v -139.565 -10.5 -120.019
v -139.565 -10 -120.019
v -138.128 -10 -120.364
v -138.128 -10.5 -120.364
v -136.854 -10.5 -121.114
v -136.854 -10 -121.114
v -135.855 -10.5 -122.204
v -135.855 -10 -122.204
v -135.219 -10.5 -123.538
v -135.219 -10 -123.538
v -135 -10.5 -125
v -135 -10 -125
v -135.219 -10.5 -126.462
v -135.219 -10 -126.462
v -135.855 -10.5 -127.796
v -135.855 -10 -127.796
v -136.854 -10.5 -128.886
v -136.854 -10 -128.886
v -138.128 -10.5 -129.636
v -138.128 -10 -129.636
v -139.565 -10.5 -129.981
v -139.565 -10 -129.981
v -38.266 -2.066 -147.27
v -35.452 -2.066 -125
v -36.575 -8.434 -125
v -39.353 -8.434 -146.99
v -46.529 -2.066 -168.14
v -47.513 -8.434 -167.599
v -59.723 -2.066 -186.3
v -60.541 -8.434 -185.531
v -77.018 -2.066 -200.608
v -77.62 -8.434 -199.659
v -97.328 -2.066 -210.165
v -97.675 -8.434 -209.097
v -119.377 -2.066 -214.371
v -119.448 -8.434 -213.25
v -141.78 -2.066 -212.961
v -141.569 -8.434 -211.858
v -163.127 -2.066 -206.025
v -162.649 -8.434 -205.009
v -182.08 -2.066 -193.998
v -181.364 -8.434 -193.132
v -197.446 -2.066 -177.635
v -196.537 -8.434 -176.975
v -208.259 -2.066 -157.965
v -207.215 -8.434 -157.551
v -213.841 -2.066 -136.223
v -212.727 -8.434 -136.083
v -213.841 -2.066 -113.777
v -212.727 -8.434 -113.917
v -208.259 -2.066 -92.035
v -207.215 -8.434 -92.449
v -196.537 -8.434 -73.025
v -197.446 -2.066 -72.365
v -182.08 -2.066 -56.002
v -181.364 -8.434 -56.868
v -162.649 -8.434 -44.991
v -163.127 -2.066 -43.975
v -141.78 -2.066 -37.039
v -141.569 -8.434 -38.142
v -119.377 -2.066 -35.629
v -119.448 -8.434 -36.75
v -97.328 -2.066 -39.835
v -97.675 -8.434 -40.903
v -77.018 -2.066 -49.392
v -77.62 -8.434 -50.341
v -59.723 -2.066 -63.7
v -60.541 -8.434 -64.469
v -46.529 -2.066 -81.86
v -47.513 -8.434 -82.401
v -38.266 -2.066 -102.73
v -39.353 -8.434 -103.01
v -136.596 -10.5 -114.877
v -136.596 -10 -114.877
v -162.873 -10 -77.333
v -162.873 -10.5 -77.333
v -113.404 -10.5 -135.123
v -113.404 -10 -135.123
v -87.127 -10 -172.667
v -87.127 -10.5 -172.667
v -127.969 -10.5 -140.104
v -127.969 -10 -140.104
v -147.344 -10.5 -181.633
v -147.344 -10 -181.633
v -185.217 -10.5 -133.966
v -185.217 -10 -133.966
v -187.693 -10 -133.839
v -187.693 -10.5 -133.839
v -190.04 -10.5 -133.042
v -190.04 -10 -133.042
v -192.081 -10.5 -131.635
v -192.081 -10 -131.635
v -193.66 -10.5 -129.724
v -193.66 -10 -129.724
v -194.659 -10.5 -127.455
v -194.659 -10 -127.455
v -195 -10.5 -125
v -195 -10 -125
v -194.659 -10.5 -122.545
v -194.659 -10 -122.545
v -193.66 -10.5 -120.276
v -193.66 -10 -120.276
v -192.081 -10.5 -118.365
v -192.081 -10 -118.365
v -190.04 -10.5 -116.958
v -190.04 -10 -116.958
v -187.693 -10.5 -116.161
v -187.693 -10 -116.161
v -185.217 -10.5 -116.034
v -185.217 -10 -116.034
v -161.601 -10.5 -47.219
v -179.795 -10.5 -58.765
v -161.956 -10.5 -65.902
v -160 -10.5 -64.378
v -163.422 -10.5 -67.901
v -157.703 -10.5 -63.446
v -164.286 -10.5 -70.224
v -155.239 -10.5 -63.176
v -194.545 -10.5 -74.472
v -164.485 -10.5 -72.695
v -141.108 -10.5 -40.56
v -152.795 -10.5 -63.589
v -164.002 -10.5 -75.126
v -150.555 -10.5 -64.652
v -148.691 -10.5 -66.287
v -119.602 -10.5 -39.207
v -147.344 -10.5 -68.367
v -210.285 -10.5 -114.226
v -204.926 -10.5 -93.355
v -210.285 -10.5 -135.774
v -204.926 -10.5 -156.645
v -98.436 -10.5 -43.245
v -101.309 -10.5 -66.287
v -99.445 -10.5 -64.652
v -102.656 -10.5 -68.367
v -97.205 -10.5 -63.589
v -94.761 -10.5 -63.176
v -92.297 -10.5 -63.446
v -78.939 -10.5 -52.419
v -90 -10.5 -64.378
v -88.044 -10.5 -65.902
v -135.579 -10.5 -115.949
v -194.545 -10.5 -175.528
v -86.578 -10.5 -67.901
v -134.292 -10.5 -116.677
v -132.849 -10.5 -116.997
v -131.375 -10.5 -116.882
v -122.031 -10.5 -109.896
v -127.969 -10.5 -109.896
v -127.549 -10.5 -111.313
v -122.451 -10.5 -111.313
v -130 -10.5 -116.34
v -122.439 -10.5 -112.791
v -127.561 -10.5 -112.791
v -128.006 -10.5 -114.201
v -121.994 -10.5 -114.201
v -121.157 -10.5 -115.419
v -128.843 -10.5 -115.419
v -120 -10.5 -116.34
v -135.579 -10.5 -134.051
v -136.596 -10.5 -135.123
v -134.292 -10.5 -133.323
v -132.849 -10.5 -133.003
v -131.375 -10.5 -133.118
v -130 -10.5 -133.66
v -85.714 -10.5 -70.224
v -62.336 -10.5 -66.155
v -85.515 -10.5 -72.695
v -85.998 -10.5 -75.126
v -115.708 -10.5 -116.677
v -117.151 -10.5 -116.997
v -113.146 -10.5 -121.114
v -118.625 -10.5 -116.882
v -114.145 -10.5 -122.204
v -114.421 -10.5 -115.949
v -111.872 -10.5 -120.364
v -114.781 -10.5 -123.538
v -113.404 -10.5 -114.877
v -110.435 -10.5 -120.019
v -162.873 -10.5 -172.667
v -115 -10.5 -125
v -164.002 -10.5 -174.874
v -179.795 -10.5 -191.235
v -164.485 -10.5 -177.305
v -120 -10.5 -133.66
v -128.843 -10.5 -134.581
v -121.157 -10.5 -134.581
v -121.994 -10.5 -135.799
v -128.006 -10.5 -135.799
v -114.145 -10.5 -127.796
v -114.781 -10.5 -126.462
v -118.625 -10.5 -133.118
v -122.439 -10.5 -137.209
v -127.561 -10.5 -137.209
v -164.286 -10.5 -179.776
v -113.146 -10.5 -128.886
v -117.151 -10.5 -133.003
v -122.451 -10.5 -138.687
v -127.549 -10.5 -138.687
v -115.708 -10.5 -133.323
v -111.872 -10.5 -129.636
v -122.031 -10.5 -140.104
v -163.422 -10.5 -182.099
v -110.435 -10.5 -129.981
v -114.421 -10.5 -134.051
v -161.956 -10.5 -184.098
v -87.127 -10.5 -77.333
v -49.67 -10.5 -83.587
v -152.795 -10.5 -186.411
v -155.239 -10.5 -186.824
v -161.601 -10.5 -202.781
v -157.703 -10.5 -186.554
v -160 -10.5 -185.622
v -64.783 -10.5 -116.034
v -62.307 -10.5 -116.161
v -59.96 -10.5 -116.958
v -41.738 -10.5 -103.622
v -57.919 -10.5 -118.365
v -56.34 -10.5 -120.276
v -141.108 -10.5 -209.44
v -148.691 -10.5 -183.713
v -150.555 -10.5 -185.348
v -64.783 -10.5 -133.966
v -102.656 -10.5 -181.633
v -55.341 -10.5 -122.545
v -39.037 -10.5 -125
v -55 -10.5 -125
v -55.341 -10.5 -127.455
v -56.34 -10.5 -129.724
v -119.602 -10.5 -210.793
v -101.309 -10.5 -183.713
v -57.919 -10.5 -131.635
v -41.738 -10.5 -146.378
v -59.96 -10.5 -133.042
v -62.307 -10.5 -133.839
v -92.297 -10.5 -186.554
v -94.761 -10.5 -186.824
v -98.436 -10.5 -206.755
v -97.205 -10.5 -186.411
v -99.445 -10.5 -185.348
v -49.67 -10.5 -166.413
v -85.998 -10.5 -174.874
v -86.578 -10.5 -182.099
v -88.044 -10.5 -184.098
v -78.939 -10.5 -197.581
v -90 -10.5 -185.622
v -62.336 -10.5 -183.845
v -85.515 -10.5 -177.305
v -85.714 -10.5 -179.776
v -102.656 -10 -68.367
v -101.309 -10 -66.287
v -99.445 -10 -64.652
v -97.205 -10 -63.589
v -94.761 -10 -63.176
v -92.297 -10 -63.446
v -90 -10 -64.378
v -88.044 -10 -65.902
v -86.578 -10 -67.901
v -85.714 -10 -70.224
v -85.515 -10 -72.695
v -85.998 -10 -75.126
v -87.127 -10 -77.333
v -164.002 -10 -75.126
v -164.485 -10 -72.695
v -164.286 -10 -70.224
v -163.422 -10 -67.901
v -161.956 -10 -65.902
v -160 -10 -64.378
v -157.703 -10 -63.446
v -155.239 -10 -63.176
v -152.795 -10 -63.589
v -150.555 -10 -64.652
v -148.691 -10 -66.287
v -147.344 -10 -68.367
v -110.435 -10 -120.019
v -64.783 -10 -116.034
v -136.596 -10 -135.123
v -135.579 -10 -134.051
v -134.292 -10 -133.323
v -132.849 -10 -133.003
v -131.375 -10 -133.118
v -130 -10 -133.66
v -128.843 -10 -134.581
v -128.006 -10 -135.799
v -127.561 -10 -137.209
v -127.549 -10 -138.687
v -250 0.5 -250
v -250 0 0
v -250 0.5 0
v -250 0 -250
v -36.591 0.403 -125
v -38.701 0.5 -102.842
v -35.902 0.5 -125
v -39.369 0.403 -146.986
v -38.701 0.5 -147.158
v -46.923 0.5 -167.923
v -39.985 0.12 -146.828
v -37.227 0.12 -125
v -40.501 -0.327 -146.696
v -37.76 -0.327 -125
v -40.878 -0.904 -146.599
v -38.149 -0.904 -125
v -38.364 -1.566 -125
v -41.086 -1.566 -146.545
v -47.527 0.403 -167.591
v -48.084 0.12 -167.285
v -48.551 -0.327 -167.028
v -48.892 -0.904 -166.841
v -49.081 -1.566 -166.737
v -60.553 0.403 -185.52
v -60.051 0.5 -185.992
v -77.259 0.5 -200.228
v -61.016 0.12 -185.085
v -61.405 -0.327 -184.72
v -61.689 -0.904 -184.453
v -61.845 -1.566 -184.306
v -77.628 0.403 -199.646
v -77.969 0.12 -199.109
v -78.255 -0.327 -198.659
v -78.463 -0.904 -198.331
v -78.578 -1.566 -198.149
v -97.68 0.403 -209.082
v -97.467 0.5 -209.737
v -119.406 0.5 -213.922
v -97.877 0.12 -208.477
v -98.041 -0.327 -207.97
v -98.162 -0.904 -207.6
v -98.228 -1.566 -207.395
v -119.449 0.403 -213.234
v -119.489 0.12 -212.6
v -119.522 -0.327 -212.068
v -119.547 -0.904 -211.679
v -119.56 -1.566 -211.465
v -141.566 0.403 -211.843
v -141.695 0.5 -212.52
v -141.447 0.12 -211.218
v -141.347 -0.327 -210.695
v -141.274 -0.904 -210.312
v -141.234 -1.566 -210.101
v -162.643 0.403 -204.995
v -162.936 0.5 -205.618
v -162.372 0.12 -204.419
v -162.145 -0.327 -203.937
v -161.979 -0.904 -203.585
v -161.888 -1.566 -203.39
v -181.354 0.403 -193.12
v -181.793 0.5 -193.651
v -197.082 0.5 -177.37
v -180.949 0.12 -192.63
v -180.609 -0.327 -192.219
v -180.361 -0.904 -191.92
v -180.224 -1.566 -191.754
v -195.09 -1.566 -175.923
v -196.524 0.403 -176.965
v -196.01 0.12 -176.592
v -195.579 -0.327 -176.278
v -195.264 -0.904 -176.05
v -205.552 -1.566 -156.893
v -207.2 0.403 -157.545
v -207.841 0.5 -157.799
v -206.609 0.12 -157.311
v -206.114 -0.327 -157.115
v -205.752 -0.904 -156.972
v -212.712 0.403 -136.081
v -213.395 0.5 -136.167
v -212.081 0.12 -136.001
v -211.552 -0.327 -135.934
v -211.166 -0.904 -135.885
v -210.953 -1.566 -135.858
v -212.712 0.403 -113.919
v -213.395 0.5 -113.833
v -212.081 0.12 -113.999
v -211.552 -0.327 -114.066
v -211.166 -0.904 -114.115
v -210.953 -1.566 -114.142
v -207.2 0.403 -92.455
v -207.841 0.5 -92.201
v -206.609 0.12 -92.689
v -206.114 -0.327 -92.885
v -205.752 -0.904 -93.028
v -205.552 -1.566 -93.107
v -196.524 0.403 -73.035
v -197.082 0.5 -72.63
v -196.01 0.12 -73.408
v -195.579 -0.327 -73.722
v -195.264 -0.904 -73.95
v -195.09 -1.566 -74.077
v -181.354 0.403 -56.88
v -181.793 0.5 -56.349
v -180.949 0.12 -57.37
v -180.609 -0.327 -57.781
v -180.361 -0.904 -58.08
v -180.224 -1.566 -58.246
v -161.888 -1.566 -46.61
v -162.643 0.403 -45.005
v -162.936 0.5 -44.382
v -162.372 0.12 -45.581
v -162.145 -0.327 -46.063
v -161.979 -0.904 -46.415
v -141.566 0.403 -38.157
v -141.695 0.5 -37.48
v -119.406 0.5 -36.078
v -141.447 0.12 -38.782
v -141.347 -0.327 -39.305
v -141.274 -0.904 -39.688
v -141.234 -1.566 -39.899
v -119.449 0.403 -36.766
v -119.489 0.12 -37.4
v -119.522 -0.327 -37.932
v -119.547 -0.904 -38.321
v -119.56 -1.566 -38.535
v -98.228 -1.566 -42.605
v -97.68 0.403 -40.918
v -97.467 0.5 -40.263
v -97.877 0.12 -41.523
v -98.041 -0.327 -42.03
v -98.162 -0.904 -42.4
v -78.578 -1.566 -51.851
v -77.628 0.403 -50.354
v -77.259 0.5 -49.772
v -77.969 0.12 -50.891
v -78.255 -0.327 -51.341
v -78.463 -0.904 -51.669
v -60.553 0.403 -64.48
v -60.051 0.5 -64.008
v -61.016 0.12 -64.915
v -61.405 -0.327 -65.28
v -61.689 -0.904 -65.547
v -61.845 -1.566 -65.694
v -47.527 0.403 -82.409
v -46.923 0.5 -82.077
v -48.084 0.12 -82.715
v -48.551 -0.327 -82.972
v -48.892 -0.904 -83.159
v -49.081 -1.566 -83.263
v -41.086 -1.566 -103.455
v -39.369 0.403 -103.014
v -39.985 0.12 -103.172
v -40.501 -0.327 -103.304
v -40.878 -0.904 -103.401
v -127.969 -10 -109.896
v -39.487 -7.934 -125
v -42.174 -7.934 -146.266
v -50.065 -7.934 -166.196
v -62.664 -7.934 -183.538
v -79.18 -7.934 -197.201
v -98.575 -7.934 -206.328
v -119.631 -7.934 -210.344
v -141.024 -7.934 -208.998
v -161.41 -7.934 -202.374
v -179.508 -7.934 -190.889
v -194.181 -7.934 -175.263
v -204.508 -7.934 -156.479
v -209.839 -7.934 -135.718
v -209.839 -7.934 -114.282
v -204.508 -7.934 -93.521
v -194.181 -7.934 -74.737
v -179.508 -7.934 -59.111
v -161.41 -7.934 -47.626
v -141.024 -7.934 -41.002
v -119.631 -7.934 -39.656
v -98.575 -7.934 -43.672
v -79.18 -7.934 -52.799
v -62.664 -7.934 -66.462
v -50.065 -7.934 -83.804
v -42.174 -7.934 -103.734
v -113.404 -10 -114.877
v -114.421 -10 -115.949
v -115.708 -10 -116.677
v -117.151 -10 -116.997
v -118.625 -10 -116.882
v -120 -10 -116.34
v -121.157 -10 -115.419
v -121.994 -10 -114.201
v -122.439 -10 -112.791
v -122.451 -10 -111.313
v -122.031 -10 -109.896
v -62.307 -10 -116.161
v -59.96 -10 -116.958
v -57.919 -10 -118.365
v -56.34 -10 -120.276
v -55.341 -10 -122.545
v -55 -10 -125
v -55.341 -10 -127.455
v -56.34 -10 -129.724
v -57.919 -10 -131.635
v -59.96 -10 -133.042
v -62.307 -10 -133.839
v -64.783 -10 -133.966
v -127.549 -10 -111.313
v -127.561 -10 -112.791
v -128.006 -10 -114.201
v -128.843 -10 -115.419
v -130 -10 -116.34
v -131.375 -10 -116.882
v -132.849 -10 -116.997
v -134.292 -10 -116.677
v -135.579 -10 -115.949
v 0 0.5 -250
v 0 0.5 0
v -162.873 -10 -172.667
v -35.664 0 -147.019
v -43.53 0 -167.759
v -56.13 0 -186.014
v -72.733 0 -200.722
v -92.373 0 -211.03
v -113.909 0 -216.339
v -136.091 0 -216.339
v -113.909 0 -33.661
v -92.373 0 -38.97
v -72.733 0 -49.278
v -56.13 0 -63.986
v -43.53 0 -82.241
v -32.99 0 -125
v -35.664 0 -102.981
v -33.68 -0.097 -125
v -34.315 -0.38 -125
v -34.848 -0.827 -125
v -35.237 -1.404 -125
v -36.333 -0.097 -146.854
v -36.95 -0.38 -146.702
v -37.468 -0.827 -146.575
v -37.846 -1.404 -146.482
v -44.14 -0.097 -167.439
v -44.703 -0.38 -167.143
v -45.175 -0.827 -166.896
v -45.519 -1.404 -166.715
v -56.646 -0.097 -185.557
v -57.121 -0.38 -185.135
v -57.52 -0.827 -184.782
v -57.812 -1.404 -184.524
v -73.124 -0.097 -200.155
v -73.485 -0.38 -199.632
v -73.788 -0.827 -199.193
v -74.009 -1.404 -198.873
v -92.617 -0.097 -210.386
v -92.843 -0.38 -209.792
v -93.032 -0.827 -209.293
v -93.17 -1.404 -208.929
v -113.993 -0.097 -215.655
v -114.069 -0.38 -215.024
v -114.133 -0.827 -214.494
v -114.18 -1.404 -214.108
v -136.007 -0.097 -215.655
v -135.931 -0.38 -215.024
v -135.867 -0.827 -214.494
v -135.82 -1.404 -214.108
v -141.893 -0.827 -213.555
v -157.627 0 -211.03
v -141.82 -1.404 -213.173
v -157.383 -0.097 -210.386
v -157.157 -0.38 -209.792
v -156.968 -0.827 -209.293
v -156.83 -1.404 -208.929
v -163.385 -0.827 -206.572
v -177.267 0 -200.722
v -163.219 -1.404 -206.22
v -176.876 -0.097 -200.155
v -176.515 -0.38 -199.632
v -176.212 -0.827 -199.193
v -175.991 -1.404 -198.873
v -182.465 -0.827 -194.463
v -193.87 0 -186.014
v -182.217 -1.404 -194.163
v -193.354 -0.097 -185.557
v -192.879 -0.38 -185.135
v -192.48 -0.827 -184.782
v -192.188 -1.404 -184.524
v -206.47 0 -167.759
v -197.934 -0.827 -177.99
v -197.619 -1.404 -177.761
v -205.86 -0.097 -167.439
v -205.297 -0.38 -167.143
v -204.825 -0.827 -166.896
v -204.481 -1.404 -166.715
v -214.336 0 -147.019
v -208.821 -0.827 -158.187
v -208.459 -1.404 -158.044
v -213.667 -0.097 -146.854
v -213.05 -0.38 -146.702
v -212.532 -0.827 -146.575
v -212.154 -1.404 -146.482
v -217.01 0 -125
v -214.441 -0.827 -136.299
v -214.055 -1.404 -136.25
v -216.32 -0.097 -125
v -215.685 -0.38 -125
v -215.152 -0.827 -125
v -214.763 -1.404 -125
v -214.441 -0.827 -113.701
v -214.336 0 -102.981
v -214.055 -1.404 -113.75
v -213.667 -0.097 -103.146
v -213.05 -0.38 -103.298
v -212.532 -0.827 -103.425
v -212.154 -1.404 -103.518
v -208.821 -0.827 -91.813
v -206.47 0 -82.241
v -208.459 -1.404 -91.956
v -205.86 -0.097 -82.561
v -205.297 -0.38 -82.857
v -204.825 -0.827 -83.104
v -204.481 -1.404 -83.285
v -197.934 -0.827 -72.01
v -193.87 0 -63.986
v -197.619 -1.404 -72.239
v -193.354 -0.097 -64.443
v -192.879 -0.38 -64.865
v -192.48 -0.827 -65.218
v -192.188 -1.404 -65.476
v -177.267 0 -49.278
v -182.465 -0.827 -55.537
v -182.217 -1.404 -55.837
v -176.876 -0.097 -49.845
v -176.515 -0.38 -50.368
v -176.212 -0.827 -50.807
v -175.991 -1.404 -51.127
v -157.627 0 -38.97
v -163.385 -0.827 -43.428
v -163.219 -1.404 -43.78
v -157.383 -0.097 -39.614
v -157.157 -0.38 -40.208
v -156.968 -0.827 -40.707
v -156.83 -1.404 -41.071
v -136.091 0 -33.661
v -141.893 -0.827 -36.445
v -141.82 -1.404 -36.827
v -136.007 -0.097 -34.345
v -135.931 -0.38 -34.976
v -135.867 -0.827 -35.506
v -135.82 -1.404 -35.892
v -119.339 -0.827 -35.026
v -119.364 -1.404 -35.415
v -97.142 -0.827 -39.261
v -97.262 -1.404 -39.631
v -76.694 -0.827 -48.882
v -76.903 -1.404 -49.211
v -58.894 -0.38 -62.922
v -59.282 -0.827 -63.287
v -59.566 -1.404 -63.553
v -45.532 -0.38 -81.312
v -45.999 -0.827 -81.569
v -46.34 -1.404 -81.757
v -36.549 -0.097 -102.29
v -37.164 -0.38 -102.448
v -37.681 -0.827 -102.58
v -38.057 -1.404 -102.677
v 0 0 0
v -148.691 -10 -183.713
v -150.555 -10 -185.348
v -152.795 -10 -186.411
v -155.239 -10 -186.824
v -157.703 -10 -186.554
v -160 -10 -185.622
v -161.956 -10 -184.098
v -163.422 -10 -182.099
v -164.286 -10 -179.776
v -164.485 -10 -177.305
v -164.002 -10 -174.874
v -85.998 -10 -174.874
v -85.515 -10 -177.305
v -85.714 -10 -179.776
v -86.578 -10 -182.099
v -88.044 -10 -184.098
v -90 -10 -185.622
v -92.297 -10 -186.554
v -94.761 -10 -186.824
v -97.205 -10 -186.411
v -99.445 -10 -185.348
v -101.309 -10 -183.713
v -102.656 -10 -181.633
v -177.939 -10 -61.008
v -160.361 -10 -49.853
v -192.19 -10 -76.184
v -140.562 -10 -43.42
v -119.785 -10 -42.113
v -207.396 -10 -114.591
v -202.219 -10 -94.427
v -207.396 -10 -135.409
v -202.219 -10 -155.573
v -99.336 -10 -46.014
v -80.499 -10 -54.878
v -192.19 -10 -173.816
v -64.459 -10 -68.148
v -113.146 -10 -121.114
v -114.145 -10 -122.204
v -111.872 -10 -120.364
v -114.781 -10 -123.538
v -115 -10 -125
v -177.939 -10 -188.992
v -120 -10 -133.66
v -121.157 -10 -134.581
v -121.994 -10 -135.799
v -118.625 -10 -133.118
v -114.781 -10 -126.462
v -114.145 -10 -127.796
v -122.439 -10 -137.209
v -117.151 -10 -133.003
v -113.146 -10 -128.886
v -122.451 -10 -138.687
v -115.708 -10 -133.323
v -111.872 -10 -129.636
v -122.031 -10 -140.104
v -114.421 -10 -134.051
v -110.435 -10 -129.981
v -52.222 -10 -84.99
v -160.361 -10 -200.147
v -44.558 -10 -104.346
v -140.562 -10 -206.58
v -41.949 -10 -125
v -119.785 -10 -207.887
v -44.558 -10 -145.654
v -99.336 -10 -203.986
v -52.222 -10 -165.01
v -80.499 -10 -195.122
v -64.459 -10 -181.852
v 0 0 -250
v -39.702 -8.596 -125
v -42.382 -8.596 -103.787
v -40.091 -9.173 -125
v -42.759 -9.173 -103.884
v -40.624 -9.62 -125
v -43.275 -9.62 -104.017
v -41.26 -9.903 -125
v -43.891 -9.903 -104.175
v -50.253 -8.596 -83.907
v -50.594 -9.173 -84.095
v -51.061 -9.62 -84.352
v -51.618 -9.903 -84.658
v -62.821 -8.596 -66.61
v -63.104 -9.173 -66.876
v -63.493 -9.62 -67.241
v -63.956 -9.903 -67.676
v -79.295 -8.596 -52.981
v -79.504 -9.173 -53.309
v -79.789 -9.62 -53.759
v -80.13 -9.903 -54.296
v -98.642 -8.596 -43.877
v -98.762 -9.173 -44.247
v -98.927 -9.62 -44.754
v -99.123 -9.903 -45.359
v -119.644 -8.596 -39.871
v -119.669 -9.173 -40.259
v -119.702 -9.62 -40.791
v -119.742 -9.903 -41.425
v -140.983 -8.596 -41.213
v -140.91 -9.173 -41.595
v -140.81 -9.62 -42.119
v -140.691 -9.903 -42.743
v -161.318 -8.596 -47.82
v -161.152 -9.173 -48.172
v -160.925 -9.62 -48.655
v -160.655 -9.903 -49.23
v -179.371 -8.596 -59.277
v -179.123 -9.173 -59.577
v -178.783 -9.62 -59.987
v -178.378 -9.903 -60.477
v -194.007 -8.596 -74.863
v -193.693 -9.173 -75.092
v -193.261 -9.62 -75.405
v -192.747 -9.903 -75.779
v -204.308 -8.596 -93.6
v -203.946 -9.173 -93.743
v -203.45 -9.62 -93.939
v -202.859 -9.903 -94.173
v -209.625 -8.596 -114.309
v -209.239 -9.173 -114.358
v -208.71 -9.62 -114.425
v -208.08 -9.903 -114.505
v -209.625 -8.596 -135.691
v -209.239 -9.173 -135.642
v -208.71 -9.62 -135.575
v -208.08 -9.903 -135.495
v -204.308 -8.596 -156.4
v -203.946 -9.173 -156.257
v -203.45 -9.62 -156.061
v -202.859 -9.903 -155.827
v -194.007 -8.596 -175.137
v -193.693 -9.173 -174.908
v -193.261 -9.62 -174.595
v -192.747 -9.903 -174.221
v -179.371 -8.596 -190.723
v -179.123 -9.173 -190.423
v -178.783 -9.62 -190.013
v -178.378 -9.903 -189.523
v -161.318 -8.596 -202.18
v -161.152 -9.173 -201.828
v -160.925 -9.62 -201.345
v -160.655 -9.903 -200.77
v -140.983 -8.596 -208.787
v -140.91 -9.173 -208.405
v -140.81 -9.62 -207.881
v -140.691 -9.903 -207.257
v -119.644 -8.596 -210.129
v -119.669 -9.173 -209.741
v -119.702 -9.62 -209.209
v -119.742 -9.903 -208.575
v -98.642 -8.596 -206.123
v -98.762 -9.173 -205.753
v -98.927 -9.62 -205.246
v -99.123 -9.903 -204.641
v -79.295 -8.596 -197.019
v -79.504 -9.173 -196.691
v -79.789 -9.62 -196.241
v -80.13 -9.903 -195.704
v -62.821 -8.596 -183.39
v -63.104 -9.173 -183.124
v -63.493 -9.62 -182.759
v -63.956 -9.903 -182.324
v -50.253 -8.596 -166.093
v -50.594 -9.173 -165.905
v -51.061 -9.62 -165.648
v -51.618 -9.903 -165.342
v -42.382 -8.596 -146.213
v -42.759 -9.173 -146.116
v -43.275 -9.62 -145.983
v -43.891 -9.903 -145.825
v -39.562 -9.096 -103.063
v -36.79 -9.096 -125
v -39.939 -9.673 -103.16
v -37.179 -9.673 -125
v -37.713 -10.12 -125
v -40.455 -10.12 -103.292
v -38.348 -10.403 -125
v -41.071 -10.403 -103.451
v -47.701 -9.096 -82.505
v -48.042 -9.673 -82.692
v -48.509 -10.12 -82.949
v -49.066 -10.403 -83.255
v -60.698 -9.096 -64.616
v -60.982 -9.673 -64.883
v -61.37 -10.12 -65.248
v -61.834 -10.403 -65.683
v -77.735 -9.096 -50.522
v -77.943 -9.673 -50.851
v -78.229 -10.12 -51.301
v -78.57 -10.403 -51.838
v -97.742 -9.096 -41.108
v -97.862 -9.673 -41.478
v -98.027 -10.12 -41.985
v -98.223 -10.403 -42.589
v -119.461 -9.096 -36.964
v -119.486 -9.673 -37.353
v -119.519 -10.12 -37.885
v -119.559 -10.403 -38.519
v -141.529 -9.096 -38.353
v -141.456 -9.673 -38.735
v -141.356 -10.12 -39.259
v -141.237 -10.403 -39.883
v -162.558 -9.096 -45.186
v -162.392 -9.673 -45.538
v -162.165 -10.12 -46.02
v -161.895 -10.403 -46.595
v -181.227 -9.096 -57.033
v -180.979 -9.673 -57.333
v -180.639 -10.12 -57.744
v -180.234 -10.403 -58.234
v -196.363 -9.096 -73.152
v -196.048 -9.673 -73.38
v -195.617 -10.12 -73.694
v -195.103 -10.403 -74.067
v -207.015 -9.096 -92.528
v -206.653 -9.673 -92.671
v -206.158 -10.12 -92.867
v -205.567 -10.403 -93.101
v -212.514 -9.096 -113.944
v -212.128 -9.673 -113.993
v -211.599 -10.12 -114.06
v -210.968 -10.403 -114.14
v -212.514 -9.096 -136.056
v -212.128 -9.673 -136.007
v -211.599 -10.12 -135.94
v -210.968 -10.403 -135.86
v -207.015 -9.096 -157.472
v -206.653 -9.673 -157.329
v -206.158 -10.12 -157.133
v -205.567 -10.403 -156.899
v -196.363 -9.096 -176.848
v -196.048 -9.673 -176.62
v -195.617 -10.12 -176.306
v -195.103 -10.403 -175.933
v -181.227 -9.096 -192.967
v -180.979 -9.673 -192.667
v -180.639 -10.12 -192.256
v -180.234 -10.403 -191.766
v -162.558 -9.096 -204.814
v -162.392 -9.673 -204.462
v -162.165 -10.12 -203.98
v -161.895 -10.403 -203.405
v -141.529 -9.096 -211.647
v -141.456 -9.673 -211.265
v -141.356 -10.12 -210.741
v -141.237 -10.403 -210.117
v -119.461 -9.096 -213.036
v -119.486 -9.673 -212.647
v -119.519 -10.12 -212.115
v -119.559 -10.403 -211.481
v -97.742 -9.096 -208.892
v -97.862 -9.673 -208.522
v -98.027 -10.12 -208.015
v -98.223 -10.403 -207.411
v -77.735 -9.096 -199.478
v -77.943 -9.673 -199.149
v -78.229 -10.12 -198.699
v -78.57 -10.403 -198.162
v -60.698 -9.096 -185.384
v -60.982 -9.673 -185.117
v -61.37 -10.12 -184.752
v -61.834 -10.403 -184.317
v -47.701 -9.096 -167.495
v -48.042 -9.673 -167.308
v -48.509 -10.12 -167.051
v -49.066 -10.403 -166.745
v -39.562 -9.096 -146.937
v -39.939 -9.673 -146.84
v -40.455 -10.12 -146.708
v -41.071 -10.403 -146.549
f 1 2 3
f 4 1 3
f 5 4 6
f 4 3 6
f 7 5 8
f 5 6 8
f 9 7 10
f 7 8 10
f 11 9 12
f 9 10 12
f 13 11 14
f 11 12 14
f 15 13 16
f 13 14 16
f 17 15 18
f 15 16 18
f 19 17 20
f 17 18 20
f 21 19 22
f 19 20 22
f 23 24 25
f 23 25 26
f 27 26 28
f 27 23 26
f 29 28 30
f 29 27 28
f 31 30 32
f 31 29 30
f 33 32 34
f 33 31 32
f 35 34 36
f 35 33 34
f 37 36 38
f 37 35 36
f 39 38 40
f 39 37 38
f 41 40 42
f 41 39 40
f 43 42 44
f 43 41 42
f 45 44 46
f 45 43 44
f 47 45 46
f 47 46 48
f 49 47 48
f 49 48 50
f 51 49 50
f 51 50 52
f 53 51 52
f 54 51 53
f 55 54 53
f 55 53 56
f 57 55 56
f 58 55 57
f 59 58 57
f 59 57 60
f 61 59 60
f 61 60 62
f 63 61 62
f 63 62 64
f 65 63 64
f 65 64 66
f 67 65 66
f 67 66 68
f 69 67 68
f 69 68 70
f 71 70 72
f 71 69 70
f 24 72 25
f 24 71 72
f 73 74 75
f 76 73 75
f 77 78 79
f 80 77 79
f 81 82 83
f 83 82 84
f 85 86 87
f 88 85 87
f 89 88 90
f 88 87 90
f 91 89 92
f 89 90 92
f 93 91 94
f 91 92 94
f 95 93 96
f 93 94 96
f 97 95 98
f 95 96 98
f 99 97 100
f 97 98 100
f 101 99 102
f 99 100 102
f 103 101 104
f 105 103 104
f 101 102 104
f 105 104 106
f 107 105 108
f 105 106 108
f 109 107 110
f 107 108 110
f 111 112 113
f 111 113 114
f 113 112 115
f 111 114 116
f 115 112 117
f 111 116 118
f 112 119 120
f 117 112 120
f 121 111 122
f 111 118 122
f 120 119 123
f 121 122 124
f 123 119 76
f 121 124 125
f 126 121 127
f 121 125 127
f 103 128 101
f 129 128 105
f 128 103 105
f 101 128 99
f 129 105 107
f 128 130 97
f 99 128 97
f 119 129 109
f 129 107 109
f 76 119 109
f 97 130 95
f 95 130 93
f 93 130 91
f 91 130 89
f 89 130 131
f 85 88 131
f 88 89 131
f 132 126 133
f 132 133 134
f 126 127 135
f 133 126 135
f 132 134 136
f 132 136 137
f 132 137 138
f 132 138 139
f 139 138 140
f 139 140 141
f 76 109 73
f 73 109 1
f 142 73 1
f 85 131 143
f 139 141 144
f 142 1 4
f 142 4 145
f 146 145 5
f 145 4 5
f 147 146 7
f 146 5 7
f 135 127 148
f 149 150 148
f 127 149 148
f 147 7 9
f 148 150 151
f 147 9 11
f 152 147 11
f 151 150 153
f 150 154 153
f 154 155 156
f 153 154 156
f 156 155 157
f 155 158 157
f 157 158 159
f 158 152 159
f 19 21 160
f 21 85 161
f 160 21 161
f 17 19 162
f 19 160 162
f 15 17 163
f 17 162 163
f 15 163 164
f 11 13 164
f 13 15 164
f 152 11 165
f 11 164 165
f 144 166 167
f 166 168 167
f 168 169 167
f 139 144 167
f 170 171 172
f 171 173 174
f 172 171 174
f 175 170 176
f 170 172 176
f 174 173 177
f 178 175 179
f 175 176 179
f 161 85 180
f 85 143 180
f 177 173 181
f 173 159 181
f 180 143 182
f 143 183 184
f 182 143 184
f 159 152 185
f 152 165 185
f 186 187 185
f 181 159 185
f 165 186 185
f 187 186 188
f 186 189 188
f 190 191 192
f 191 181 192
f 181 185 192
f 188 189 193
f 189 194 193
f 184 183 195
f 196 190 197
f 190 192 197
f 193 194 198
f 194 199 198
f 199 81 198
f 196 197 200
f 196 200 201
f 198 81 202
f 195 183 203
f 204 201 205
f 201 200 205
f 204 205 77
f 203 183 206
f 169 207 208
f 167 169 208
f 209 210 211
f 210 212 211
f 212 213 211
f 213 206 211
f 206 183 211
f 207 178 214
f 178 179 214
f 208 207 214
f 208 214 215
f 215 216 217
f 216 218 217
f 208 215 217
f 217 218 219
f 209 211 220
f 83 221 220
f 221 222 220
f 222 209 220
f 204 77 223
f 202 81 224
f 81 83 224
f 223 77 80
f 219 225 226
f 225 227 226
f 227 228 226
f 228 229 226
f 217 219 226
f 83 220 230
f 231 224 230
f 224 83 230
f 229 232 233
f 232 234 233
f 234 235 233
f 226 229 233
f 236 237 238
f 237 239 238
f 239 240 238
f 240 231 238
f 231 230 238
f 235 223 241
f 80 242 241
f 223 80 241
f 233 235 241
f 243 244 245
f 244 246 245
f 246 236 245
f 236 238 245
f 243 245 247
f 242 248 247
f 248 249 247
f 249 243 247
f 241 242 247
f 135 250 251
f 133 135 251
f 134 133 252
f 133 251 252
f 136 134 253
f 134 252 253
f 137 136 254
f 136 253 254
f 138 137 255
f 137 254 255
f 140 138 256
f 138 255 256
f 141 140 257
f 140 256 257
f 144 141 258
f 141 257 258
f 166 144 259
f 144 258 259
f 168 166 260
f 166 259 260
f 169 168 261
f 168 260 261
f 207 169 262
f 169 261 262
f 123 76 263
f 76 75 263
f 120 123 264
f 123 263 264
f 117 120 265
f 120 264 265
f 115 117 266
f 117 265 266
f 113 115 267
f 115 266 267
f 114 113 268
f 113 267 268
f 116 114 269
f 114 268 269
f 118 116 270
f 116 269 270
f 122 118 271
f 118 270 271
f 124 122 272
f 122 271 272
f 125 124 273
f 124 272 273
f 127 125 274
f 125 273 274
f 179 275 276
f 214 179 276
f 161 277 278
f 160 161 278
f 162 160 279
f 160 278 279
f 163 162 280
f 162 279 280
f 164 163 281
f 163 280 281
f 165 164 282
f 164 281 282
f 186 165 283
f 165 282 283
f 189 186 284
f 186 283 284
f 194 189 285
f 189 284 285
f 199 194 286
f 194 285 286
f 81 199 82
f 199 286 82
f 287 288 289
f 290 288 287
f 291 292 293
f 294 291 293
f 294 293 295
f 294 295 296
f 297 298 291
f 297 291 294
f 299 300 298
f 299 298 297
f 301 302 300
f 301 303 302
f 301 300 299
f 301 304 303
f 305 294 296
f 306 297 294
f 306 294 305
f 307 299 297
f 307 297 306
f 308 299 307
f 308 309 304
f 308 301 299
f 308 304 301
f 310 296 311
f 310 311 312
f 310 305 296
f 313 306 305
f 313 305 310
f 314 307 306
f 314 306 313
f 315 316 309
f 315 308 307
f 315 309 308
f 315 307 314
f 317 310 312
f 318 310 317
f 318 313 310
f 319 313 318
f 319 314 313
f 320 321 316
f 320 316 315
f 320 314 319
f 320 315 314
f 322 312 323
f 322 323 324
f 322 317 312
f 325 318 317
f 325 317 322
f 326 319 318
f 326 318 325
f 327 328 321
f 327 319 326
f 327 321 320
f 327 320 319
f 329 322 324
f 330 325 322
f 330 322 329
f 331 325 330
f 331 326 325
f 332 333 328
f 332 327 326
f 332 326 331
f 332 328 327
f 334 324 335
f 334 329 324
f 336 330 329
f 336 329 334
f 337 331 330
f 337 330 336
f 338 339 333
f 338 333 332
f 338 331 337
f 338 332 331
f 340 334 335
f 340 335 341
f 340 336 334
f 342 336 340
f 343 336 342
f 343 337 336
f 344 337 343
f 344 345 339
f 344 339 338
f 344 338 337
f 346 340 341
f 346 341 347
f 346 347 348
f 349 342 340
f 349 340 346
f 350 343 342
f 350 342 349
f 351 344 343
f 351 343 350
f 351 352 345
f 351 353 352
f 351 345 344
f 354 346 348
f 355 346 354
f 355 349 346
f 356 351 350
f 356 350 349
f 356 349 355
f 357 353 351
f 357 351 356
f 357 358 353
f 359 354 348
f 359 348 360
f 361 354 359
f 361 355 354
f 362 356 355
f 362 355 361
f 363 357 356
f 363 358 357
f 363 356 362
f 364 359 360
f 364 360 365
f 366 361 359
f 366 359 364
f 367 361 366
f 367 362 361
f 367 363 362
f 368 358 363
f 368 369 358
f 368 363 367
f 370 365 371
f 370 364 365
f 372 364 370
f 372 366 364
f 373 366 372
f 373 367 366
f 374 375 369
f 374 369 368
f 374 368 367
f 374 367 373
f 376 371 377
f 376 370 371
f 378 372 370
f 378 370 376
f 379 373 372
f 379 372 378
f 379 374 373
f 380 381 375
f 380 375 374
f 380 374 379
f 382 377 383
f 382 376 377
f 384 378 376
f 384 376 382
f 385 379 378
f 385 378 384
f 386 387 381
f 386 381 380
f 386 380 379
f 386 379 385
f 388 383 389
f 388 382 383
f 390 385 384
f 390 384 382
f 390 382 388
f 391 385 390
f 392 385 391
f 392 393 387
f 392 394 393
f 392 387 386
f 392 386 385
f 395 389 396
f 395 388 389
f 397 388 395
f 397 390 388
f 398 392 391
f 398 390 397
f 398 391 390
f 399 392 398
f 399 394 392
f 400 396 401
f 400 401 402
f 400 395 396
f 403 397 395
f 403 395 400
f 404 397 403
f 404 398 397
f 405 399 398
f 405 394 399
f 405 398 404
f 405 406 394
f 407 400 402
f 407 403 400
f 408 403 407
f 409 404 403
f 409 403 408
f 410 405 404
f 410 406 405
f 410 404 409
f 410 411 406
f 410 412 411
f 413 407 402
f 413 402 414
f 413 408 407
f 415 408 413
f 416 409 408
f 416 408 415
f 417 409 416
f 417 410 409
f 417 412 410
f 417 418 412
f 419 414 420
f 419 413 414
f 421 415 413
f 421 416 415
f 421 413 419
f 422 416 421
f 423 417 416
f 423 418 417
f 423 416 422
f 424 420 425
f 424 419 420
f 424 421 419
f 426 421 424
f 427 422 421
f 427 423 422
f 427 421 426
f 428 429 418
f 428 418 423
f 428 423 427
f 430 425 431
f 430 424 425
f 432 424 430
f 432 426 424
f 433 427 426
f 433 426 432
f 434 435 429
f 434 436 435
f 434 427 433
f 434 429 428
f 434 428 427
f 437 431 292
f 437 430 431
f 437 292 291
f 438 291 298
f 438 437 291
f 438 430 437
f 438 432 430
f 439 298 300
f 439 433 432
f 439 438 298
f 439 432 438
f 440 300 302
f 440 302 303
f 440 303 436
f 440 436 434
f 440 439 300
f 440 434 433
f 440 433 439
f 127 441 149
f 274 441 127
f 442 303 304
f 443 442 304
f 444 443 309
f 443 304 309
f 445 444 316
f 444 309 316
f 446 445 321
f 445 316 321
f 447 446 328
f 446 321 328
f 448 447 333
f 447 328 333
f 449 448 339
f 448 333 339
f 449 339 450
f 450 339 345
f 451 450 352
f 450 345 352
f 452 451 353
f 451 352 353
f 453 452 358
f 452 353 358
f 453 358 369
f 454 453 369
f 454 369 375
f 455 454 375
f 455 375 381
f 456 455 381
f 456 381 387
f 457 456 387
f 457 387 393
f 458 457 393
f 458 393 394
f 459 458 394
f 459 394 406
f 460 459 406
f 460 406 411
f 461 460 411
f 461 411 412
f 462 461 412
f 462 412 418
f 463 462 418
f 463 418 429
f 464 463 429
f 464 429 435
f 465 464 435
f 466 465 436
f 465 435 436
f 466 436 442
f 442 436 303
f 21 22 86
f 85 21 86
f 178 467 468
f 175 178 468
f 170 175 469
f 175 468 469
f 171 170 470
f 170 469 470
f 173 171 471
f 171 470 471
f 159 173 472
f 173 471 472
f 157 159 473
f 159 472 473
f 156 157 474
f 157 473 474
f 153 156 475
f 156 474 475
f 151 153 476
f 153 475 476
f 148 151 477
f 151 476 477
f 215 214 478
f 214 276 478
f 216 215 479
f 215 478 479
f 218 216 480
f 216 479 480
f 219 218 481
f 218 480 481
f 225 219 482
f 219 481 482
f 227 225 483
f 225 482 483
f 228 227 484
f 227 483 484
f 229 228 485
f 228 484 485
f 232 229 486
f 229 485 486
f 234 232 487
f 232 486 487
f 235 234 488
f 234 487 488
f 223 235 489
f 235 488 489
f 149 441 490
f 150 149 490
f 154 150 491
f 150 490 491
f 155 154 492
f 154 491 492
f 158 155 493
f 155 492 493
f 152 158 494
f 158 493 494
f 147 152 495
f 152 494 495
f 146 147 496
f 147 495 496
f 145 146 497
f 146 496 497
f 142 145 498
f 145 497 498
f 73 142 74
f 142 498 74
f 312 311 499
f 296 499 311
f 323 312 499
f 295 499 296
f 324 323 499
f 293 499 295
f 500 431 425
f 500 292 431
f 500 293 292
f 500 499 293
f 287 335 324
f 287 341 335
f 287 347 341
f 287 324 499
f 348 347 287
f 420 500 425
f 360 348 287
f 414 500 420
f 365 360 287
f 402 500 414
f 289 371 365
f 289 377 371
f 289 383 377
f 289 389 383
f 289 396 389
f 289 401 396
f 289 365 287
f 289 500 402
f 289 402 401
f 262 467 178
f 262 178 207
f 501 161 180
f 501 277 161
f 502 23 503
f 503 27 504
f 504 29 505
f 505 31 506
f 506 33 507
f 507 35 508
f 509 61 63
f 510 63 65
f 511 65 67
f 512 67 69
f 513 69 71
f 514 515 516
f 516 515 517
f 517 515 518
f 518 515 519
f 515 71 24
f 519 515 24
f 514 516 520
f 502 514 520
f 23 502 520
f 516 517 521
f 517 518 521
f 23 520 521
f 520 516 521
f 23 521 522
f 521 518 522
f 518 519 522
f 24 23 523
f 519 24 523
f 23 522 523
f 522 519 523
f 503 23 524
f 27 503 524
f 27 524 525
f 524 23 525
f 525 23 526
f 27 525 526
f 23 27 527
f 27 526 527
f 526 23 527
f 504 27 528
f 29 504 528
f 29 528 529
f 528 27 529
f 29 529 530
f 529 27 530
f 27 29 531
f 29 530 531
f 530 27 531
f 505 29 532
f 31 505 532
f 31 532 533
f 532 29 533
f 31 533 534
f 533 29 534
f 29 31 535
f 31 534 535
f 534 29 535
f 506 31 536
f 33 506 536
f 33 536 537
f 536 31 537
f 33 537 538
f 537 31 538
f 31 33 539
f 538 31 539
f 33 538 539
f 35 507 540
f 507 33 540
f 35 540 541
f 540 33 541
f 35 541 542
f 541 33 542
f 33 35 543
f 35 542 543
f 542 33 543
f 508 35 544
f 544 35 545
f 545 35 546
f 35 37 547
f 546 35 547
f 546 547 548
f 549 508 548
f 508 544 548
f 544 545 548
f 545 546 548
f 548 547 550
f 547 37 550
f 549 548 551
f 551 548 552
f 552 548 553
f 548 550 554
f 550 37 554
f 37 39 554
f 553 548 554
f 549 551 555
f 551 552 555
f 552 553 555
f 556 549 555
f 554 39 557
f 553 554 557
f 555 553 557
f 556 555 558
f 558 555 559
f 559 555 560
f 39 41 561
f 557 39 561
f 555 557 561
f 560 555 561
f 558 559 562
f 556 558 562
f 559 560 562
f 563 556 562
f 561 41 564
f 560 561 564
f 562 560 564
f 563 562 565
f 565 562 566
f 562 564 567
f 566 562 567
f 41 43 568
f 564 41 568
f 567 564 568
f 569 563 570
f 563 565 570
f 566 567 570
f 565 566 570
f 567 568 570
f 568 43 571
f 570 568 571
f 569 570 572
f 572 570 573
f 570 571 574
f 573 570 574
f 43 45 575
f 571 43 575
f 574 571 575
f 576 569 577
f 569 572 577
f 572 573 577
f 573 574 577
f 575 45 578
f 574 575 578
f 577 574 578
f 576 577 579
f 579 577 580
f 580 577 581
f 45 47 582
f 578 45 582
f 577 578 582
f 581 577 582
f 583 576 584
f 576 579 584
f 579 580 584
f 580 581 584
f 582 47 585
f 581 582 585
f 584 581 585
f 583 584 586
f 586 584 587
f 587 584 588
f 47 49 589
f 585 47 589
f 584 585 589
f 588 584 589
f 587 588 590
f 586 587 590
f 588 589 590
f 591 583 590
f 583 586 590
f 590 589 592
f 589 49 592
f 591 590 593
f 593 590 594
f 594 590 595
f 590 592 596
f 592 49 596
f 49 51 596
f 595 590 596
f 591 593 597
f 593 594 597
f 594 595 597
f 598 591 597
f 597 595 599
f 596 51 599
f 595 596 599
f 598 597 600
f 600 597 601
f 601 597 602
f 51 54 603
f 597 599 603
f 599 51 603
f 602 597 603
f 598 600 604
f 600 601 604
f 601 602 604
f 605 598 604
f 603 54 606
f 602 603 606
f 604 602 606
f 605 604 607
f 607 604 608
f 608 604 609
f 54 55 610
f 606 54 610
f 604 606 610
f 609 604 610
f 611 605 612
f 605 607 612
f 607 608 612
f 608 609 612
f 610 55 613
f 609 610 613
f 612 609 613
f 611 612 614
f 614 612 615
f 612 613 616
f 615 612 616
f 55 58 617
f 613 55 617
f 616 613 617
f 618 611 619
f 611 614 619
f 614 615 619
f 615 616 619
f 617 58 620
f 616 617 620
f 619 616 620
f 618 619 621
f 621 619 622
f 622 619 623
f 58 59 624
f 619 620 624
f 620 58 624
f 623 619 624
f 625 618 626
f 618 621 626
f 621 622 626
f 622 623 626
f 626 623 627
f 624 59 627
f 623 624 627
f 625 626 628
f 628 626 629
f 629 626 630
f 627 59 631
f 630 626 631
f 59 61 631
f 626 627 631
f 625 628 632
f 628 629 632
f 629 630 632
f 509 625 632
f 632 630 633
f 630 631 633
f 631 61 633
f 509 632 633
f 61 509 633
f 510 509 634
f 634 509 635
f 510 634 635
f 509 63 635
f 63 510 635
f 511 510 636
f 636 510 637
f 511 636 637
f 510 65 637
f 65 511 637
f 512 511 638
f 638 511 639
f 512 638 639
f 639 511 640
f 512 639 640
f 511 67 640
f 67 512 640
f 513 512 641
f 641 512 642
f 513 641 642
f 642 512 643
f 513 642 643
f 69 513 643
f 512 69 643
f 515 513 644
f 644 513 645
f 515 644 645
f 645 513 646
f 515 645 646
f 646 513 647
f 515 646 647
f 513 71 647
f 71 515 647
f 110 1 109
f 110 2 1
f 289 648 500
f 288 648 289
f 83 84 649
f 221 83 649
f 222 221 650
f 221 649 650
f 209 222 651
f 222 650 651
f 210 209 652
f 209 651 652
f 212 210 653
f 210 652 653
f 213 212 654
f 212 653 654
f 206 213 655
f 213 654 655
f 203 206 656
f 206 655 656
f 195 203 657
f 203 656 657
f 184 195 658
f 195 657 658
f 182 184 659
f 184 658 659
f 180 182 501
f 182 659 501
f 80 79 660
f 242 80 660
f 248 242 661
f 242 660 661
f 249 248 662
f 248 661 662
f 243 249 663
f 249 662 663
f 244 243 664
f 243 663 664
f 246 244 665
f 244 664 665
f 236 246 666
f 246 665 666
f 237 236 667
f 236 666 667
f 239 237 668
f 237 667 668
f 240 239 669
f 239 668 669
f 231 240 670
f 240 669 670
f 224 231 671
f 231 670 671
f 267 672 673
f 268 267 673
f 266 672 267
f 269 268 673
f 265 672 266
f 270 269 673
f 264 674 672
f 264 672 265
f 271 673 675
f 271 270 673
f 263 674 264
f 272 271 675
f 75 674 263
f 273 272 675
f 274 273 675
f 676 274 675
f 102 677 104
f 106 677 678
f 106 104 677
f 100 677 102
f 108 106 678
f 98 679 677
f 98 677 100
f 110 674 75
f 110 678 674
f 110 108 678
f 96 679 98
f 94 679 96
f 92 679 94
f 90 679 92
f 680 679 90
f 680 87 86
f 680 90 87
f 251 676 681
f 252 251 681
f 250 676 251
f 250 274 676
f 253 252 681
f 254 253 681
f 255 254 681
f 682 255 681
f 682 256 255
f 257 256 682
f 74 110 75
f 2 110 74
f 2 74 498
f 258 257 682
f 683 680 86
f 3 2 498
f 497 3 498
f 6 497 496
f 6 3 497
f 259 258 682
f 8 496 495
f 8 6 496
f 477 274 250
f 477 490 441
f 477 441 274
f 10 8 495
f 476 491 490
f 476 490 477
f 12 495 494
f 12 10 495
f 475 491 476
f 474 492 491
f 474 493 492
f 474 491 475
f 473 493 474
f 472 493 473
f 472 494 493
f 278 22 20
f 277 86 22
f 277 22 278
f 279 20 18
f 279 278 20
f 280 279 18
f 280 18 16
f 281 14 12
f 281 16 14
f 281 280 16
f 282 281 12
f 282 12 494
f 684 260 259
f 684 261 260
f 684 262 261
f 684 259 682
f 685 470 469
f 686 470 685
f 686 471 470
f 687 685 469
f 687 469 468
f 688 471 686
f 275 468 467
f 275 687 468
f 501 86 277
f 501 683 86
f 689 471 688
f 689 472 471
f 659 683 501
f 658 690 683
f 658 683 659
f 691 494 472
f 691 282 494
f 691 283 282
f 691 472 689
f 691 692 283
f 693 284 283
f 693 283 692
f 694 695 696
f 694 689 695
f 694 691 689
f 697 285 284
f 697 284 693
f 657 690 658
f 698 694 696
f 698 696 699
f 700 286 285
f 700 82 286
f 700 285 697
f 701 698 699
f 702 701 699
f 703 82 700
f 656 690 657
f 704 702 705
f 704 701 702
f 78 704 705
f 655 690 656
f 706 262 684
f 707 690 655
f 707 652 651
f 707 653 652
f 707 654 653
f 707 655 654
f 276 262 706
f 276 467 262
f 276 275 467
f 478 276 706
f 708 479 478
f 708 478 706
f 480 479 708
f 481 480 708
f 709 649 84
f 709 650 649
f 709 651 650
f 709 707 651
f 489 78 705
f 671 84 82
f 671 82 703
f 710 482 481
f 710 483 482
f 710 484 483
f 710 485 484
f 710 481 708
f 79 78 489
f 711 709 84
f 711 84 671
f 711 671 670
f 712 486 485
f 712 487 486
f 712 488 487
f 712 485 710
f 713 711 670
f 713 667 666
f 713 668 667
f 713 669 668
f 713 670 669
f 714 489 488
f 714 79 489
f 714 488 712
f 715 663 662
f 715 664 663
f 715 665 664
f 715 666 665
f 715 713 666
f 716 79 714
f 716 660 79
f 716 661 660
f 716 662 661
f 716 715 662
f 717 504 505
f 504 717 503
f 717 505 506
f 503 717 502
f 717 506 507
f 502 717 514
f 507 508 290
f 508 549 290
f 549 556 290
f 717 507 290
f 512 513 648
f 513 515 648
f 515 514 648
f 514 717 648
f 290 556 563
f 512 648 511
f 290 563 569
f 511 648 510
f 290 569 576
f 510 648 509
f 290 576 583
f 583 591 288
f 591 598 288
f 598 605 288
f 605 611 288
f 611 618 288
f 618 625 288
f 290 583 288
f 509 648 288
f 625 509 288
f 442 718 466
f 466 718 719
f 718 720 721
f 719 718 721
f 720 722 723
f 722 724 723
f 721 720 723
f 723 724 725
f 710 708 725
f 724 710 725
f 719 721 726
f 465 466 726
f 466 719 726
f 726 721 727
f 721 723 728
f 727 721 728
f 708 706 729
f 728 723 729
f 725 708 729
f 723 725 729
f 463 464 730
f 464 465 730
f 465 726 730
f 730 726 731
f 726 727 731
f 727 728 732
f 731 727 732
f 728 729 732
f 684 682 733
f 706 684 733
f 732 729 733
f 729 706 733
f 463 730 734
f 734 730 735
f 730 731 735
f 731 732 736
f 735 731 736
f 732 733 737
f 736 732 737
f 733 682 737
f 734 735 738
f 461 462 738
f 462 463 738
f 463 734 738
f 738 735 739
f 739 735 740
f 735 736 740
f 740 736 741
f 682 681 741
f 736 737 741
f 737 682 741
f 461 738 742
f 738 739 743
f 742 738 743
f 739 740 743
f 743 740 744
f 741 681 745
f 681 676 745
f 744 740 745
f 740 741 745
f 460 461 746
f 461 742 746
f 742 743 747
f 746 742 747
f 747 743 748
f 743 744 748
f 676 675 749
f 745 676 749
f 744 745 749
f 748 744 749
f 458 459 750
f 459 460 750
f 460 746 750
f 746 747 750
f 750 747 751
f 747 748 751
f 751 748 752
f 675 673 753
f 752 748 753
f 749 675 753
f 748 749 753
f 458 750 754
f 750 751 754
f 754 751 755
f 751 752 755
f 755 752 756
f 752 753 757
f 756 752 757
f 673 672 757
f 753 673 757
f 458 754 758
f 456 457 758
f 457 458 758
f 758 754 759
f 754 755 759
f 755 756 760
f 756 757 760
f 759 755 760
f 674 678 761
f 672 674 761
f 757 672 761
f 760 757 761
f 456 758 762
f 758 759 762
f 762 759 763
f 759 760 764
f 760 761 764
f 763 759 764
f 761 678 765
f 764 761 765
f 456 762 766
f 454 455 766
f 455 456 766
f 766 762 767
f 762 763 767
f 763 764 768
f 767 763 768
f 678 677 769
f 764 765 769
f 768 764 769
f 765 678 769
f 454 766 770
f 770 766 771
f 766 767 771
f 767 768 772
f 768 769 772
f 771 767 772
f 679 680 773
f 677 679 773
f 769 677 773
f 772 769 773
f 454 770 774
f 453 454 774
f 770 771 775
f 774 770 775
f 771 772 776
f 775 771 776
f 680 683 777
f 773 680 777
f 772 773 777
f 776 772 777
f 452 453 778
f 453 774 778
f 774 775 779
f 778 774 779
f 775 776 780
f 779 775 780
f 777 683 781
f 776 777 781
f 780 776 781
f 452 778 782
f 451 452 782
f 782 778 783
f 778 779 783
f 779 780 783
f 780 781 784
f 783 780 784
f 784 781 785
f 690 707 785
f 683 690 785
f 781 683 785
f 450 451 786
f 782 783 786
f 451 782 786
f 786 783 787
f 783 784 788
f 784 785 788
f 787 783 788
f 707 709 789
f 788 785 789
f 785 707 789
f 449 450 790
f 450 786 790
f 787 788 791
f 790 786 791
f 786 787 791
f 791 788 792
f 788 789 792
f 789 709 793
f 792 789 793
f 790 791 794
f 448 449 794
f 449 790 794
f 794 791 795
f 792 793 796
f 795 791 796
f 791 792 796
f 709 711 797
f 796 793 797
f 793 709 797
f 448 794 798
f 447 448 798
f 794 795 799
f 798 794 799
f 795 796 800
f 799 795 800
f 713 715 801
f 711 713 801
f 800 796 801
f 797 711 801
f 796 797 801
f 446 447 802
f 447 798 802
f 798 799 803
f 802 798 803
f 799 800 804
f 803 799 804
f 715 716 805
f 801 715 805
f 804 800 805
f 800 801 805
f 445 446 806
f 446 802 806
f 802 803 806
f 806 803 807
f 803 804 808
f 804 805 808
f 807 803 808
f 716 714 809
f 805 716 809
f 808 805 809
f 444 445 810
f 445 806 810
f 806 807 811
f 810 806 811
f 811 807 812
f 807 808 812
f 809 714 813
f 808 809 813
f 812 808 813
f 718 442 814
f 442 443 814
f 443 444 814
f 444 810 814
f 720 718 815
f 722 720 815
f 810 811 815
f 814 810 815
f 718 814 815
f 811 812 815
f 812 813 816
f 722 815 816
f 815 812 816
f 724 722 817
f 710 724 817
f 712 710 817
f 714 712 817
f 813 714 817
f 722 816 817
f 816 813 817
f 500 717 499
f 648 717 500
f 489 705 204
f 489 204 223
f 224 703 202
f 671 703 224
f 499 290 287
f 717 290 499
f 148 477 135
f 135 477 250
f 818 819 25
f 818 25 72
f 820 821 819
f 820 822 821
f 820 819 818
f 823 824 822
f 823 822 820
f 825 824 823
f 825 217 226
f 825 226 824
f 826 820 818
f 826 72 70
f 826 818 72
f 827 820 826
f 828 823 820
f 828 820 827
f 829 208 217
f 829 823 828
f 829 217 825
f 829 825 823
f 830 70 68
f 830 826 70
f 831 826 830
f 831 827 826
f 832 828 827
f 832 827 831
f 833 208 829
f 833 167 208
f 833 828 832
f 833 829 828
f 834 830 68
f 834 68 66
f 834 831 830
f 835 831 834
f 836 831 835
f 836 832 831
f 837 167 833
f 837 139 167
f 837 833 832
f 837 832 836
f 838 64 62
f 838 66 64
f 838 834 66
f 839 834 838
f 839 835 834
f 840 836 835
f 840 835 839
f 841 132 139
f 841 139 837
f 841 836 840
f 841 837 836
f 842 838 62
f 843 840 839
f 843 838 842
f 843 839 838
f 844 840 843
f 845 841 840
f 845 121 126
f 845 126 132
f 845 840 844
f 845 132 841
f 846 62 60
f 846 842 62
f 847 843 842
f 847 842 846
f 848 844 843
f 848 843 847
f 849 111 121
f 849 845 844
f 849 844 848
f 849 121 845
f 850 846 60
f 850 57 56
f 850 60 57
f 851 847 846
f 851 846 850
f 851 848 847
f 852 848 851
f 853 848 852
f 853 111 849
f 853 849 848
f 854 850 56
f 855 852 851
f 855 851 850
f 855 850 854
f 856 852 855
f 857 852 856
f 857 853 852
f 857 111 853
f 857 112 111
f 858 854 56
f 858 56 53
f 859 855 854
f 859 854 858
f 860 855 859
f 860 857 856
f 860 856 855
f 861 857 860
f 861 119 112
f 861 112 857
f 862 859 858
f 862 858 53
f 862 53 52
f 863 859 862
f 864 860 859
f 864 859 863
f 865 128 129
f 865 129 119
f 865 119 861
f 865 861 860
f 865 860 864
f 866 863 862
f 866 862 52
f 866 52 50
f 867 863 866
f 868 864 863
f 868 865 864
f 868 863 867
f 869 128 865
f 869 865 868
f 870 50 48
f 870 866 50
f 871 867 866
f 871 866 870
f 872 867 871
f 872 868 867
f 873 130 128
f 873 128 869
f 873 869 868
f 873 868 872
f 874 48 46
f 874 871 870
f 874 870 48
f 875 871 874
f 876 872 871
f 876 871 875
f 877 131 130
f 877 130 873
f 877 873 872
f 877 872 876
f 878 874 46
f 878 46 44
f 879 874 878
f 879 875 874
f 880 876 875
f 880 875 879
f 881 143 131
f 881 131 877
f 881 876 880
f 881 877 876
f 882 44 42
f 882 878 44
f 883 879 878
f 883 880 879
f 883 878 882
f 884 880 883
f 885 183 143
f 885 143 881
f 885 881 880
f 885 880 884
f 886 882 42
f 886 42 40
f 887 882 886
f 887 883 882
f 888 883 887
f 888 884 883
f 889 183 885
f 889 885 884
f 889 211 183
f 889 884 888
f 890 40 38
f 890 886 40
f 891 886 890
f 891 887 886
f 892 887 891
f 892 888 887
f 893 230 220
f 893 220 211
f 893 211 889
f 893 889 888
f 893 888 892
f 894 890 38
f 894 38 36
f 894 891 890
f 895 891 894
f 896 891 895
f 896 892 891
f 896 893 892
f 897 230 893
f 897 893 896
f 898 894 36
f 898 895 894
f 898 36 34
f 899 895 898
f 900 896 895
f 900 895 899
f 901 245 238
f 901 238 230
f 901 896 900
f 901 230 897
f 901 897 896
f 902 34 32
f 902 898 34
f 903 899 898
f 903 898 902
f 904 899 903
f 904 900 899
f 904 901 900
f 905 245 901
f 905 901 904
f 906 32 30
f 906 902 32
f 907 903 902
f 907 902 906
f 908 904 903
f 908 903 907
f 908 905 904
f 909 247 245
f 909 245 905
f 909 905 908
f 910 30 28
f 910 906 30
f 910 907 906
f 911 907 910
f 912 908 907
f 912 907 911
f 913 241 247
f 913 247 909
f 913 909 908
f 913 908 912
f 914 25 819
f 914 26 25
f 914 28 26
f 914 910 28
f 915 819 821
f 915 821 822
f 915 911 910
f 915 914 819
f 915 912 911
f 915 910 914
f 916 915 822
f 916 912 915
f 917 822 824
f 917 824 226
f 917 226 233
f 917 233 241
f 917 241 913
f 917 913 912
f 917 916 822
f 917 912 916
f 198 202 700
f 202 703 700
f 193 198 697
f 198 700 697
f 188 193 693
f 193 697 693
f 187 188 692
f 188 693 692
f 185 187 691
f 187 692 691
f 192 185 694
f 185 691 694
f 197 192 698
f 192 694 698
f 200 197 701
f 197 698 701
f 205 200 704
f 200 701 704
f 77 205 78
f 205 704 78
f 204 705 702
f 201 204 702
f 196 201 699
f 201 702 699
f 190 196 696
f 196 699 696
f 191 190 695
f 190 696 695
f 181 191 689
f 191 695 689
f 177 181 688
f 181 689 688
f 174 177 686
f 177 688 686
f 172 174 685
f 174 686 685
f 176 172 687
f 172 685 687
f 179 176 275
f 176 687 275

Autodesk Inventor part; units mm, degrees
ref_plane "YZ Plane" through (0, 0, 0) normal (1, 0, 0) x (0, 1, 0)
ref_plane "XZ Plane" through (0, 0, 0) normal (0, 1, 0) x (-1, 0, 0)
sketch "Sketch1" plane through (0, 0, 0) normal (0, 1, 0) x (-1, 0, 0)
  line L0 (0, 0) -> (250, 0)
  line L1 (250, 0) -> (250, -250)
  line L2 (250, -250) -> (0, -250)
  line L3 (0, -250) -> (0, 0)
  dimension "d0" = 250
  dimension "d1" = 250
extrude "Plate1" add sketch "Sketch1" along normal blind 0.5
sketch "Sketch2" plane through (0, 0.5, 0) normal (0, 1, 0) x (1, 0, 0)
  line L0 (0, 0) -> (-250, 0) construction
  line L1 (0, 250) -> (0, 0) construction
  circle A0 centre (-125, 125) radius 90
  line L2 (-125, 125) -> (-215, 125) construction
  line L3 (-125, 125) -> (-125, 35) construction
  circle A1 centre (-125, 125) radius 87
  dimension "d3" = 125
  dimension "d4" = 125
  dimension "d5" = 180
  dimension "d29" = 3
sketch "Sketch2 outline for Extrusion5" plane through (0, 0.5, 0) normal (0, 1, 0) x (1, 0, 0)
  circle A0 centre (-125, 125) radius 90
extrude "Extrusion5" add sketch "Sketch2 outline for Extrusion5" against normal blind 11 draft -10
extrude "Extrusion6" cut sketch "Sketch2" against normal blind 10.5 draft -10 contours A1
fillet "Fillet1" radius 2.5 4 edges at (-212, 0.5, -125) (-214.9118, 0, -125) (-213.0604, -10.5, -125) (-210.1486, -10, -125)
ref_plane "Work Plane6" through (-125, -10, -125) normal (0, 1, 0) x (-1, 0, 0)
ref_plane "Work Plane5" through (-125, 0.5, -125) normal (0, 1, 0) x (-1, 0, 0)
sketch "Sketch6" plane through (-125, -10, -125) normal (0, 1, 0) x (-1, 0, 0)
  line L0 (0, 0) -> (90, 0) construction
  line L1 (0, 0) -> (0, 90) construction
  arc A0 (60.217391, -8.965909) -> (60.217391, 8.965909) centre (61, 0) ccw
  arc A1 (14.565217, 4.981061) -> (14.565217, -4.981061) centre (15, 0) ccw
  line L2 (14.565217, -4.981061) -> (60.217391, -8.965909)
  line L3 (14.565217, 4.981061) -> (60.217391, 8.965909)
  line L4 (10, 0) -> (70, 0) construction
  arc A2 (2.968884, 15.104379) -> (11.596334, 10.123318) centre (7.5, 12.990381) ccw
  line L5 (2.968884, 15.104379) -> (22.343991, 56.632745)
  line L6 (5, 8.660254) -> (35, 60.621778) construction
  line L7 (11.596334, 10.123318) -> (37.873401, 47.666836)
  arc A3 (37.873401, 47.666836) -> (22.343991, 56.632745) centre (30.5, 52.82755) ccw
  arc A4 (-11.596334, 10.123318) -> (-2.968884, 15.104379) centre (-7.5, 12.990381) ccw
  line L8 (-11.596334, 10.123318) -> (-37.873401, 47.666836)
  line L9 (-5, 8.660254) -> (-35, 60.621778) construction
  line L10 (-2.968884, 15.104379) -> (-22.343991, 56.632745)
  arc A5 (-22.343991, 56.632745) -> (-37.873401, 47.666836) centre (-30.5, 52.82755) ccw
  arc A6 (-14.565217, -4.981061) -> (-14.565217, 4.981061) centre (-15, 0) ccw
  line L11 (-14.565217, -4.981061) -> (-60.217391, -8.965909)
  line L12 (-10, 0) -> (-70, 0) construction
  line L13 (-14.565217, 4.981061) -> (-60.217391, 8.965909)
  arc A7 (-60.217391, 8.965909) -> (-60.217391, -8.965909) centre (-61, 0) ccw
  arc A8 (-2.968884, -15.104379) -> (-11.596334, -10.123318) centre (-7.5, -12.990381) ccw
  line L14 (-2.968884, -15.104379) -> (-22.343991, -56.632745)
  line L15 (-5, -8.660254) -> (-35, -60.621778) construction
  line L16 (-11.596334, -10.123318) -> (-37.873401, -47.666836)
  arc A9 (-37.873401, -47.666836) -> (-22.343991, -56.632745) centre (-30.5, -52.82755) ccw
  arc A10 (11.596334, -10.123318) -> (2.968884, -15.104379) centre (7.5, -12.990381) ccw
  line L17 (11.596334, -10.123318) -> (37.873401, -47.666836)
  line L18 (5, -8.660254) -> (35, -60.621778) construction
  line L19 (2.968884, -15.104379) -> (22.343991, -56.632745)
  arc A11 (22.343991, -56.632745) -> (37.873401, -47.666836) centre (30.5, -52.82755) ccw
  point P0 (-125, 125)
  dimension "d38" = 5
  dimension "d39" = 9
  dimension "d40" = 15
  dimension "d41" = 60
  dimension "d42" = 360
extrude "Extrusion7" cut sketch "Sketch6" against normal blind 0.5
equation "\"d32\" = Profile - Thickness"
equation "\"d34\" = 5 * Thickness"
equation "\"d43\" = Thickness"
equation "\"d2\" = Thickness"
equation "\"BendRadius\" = Thickness"
equation "\"BendReliefWidth\" = Thickness"
equation "\"BendReliefDepth\" = 0.5 * Thickness"
equation "\"CornerReliefSize\" = 4 * Thickness"
equation "\"MinimumRemnant\" = 2 * Thickness"
equation "\"TransitionRadius\" = BendRadius"
equation "\"JacobiRadiusSize\" = BendRadius"
equation "\"GapSize\" = Thickness"
equation "\"Profile\" = 11"
equation "\"Thickness\" = 0.5"
properties part number "A2.2-big-punch-3"
